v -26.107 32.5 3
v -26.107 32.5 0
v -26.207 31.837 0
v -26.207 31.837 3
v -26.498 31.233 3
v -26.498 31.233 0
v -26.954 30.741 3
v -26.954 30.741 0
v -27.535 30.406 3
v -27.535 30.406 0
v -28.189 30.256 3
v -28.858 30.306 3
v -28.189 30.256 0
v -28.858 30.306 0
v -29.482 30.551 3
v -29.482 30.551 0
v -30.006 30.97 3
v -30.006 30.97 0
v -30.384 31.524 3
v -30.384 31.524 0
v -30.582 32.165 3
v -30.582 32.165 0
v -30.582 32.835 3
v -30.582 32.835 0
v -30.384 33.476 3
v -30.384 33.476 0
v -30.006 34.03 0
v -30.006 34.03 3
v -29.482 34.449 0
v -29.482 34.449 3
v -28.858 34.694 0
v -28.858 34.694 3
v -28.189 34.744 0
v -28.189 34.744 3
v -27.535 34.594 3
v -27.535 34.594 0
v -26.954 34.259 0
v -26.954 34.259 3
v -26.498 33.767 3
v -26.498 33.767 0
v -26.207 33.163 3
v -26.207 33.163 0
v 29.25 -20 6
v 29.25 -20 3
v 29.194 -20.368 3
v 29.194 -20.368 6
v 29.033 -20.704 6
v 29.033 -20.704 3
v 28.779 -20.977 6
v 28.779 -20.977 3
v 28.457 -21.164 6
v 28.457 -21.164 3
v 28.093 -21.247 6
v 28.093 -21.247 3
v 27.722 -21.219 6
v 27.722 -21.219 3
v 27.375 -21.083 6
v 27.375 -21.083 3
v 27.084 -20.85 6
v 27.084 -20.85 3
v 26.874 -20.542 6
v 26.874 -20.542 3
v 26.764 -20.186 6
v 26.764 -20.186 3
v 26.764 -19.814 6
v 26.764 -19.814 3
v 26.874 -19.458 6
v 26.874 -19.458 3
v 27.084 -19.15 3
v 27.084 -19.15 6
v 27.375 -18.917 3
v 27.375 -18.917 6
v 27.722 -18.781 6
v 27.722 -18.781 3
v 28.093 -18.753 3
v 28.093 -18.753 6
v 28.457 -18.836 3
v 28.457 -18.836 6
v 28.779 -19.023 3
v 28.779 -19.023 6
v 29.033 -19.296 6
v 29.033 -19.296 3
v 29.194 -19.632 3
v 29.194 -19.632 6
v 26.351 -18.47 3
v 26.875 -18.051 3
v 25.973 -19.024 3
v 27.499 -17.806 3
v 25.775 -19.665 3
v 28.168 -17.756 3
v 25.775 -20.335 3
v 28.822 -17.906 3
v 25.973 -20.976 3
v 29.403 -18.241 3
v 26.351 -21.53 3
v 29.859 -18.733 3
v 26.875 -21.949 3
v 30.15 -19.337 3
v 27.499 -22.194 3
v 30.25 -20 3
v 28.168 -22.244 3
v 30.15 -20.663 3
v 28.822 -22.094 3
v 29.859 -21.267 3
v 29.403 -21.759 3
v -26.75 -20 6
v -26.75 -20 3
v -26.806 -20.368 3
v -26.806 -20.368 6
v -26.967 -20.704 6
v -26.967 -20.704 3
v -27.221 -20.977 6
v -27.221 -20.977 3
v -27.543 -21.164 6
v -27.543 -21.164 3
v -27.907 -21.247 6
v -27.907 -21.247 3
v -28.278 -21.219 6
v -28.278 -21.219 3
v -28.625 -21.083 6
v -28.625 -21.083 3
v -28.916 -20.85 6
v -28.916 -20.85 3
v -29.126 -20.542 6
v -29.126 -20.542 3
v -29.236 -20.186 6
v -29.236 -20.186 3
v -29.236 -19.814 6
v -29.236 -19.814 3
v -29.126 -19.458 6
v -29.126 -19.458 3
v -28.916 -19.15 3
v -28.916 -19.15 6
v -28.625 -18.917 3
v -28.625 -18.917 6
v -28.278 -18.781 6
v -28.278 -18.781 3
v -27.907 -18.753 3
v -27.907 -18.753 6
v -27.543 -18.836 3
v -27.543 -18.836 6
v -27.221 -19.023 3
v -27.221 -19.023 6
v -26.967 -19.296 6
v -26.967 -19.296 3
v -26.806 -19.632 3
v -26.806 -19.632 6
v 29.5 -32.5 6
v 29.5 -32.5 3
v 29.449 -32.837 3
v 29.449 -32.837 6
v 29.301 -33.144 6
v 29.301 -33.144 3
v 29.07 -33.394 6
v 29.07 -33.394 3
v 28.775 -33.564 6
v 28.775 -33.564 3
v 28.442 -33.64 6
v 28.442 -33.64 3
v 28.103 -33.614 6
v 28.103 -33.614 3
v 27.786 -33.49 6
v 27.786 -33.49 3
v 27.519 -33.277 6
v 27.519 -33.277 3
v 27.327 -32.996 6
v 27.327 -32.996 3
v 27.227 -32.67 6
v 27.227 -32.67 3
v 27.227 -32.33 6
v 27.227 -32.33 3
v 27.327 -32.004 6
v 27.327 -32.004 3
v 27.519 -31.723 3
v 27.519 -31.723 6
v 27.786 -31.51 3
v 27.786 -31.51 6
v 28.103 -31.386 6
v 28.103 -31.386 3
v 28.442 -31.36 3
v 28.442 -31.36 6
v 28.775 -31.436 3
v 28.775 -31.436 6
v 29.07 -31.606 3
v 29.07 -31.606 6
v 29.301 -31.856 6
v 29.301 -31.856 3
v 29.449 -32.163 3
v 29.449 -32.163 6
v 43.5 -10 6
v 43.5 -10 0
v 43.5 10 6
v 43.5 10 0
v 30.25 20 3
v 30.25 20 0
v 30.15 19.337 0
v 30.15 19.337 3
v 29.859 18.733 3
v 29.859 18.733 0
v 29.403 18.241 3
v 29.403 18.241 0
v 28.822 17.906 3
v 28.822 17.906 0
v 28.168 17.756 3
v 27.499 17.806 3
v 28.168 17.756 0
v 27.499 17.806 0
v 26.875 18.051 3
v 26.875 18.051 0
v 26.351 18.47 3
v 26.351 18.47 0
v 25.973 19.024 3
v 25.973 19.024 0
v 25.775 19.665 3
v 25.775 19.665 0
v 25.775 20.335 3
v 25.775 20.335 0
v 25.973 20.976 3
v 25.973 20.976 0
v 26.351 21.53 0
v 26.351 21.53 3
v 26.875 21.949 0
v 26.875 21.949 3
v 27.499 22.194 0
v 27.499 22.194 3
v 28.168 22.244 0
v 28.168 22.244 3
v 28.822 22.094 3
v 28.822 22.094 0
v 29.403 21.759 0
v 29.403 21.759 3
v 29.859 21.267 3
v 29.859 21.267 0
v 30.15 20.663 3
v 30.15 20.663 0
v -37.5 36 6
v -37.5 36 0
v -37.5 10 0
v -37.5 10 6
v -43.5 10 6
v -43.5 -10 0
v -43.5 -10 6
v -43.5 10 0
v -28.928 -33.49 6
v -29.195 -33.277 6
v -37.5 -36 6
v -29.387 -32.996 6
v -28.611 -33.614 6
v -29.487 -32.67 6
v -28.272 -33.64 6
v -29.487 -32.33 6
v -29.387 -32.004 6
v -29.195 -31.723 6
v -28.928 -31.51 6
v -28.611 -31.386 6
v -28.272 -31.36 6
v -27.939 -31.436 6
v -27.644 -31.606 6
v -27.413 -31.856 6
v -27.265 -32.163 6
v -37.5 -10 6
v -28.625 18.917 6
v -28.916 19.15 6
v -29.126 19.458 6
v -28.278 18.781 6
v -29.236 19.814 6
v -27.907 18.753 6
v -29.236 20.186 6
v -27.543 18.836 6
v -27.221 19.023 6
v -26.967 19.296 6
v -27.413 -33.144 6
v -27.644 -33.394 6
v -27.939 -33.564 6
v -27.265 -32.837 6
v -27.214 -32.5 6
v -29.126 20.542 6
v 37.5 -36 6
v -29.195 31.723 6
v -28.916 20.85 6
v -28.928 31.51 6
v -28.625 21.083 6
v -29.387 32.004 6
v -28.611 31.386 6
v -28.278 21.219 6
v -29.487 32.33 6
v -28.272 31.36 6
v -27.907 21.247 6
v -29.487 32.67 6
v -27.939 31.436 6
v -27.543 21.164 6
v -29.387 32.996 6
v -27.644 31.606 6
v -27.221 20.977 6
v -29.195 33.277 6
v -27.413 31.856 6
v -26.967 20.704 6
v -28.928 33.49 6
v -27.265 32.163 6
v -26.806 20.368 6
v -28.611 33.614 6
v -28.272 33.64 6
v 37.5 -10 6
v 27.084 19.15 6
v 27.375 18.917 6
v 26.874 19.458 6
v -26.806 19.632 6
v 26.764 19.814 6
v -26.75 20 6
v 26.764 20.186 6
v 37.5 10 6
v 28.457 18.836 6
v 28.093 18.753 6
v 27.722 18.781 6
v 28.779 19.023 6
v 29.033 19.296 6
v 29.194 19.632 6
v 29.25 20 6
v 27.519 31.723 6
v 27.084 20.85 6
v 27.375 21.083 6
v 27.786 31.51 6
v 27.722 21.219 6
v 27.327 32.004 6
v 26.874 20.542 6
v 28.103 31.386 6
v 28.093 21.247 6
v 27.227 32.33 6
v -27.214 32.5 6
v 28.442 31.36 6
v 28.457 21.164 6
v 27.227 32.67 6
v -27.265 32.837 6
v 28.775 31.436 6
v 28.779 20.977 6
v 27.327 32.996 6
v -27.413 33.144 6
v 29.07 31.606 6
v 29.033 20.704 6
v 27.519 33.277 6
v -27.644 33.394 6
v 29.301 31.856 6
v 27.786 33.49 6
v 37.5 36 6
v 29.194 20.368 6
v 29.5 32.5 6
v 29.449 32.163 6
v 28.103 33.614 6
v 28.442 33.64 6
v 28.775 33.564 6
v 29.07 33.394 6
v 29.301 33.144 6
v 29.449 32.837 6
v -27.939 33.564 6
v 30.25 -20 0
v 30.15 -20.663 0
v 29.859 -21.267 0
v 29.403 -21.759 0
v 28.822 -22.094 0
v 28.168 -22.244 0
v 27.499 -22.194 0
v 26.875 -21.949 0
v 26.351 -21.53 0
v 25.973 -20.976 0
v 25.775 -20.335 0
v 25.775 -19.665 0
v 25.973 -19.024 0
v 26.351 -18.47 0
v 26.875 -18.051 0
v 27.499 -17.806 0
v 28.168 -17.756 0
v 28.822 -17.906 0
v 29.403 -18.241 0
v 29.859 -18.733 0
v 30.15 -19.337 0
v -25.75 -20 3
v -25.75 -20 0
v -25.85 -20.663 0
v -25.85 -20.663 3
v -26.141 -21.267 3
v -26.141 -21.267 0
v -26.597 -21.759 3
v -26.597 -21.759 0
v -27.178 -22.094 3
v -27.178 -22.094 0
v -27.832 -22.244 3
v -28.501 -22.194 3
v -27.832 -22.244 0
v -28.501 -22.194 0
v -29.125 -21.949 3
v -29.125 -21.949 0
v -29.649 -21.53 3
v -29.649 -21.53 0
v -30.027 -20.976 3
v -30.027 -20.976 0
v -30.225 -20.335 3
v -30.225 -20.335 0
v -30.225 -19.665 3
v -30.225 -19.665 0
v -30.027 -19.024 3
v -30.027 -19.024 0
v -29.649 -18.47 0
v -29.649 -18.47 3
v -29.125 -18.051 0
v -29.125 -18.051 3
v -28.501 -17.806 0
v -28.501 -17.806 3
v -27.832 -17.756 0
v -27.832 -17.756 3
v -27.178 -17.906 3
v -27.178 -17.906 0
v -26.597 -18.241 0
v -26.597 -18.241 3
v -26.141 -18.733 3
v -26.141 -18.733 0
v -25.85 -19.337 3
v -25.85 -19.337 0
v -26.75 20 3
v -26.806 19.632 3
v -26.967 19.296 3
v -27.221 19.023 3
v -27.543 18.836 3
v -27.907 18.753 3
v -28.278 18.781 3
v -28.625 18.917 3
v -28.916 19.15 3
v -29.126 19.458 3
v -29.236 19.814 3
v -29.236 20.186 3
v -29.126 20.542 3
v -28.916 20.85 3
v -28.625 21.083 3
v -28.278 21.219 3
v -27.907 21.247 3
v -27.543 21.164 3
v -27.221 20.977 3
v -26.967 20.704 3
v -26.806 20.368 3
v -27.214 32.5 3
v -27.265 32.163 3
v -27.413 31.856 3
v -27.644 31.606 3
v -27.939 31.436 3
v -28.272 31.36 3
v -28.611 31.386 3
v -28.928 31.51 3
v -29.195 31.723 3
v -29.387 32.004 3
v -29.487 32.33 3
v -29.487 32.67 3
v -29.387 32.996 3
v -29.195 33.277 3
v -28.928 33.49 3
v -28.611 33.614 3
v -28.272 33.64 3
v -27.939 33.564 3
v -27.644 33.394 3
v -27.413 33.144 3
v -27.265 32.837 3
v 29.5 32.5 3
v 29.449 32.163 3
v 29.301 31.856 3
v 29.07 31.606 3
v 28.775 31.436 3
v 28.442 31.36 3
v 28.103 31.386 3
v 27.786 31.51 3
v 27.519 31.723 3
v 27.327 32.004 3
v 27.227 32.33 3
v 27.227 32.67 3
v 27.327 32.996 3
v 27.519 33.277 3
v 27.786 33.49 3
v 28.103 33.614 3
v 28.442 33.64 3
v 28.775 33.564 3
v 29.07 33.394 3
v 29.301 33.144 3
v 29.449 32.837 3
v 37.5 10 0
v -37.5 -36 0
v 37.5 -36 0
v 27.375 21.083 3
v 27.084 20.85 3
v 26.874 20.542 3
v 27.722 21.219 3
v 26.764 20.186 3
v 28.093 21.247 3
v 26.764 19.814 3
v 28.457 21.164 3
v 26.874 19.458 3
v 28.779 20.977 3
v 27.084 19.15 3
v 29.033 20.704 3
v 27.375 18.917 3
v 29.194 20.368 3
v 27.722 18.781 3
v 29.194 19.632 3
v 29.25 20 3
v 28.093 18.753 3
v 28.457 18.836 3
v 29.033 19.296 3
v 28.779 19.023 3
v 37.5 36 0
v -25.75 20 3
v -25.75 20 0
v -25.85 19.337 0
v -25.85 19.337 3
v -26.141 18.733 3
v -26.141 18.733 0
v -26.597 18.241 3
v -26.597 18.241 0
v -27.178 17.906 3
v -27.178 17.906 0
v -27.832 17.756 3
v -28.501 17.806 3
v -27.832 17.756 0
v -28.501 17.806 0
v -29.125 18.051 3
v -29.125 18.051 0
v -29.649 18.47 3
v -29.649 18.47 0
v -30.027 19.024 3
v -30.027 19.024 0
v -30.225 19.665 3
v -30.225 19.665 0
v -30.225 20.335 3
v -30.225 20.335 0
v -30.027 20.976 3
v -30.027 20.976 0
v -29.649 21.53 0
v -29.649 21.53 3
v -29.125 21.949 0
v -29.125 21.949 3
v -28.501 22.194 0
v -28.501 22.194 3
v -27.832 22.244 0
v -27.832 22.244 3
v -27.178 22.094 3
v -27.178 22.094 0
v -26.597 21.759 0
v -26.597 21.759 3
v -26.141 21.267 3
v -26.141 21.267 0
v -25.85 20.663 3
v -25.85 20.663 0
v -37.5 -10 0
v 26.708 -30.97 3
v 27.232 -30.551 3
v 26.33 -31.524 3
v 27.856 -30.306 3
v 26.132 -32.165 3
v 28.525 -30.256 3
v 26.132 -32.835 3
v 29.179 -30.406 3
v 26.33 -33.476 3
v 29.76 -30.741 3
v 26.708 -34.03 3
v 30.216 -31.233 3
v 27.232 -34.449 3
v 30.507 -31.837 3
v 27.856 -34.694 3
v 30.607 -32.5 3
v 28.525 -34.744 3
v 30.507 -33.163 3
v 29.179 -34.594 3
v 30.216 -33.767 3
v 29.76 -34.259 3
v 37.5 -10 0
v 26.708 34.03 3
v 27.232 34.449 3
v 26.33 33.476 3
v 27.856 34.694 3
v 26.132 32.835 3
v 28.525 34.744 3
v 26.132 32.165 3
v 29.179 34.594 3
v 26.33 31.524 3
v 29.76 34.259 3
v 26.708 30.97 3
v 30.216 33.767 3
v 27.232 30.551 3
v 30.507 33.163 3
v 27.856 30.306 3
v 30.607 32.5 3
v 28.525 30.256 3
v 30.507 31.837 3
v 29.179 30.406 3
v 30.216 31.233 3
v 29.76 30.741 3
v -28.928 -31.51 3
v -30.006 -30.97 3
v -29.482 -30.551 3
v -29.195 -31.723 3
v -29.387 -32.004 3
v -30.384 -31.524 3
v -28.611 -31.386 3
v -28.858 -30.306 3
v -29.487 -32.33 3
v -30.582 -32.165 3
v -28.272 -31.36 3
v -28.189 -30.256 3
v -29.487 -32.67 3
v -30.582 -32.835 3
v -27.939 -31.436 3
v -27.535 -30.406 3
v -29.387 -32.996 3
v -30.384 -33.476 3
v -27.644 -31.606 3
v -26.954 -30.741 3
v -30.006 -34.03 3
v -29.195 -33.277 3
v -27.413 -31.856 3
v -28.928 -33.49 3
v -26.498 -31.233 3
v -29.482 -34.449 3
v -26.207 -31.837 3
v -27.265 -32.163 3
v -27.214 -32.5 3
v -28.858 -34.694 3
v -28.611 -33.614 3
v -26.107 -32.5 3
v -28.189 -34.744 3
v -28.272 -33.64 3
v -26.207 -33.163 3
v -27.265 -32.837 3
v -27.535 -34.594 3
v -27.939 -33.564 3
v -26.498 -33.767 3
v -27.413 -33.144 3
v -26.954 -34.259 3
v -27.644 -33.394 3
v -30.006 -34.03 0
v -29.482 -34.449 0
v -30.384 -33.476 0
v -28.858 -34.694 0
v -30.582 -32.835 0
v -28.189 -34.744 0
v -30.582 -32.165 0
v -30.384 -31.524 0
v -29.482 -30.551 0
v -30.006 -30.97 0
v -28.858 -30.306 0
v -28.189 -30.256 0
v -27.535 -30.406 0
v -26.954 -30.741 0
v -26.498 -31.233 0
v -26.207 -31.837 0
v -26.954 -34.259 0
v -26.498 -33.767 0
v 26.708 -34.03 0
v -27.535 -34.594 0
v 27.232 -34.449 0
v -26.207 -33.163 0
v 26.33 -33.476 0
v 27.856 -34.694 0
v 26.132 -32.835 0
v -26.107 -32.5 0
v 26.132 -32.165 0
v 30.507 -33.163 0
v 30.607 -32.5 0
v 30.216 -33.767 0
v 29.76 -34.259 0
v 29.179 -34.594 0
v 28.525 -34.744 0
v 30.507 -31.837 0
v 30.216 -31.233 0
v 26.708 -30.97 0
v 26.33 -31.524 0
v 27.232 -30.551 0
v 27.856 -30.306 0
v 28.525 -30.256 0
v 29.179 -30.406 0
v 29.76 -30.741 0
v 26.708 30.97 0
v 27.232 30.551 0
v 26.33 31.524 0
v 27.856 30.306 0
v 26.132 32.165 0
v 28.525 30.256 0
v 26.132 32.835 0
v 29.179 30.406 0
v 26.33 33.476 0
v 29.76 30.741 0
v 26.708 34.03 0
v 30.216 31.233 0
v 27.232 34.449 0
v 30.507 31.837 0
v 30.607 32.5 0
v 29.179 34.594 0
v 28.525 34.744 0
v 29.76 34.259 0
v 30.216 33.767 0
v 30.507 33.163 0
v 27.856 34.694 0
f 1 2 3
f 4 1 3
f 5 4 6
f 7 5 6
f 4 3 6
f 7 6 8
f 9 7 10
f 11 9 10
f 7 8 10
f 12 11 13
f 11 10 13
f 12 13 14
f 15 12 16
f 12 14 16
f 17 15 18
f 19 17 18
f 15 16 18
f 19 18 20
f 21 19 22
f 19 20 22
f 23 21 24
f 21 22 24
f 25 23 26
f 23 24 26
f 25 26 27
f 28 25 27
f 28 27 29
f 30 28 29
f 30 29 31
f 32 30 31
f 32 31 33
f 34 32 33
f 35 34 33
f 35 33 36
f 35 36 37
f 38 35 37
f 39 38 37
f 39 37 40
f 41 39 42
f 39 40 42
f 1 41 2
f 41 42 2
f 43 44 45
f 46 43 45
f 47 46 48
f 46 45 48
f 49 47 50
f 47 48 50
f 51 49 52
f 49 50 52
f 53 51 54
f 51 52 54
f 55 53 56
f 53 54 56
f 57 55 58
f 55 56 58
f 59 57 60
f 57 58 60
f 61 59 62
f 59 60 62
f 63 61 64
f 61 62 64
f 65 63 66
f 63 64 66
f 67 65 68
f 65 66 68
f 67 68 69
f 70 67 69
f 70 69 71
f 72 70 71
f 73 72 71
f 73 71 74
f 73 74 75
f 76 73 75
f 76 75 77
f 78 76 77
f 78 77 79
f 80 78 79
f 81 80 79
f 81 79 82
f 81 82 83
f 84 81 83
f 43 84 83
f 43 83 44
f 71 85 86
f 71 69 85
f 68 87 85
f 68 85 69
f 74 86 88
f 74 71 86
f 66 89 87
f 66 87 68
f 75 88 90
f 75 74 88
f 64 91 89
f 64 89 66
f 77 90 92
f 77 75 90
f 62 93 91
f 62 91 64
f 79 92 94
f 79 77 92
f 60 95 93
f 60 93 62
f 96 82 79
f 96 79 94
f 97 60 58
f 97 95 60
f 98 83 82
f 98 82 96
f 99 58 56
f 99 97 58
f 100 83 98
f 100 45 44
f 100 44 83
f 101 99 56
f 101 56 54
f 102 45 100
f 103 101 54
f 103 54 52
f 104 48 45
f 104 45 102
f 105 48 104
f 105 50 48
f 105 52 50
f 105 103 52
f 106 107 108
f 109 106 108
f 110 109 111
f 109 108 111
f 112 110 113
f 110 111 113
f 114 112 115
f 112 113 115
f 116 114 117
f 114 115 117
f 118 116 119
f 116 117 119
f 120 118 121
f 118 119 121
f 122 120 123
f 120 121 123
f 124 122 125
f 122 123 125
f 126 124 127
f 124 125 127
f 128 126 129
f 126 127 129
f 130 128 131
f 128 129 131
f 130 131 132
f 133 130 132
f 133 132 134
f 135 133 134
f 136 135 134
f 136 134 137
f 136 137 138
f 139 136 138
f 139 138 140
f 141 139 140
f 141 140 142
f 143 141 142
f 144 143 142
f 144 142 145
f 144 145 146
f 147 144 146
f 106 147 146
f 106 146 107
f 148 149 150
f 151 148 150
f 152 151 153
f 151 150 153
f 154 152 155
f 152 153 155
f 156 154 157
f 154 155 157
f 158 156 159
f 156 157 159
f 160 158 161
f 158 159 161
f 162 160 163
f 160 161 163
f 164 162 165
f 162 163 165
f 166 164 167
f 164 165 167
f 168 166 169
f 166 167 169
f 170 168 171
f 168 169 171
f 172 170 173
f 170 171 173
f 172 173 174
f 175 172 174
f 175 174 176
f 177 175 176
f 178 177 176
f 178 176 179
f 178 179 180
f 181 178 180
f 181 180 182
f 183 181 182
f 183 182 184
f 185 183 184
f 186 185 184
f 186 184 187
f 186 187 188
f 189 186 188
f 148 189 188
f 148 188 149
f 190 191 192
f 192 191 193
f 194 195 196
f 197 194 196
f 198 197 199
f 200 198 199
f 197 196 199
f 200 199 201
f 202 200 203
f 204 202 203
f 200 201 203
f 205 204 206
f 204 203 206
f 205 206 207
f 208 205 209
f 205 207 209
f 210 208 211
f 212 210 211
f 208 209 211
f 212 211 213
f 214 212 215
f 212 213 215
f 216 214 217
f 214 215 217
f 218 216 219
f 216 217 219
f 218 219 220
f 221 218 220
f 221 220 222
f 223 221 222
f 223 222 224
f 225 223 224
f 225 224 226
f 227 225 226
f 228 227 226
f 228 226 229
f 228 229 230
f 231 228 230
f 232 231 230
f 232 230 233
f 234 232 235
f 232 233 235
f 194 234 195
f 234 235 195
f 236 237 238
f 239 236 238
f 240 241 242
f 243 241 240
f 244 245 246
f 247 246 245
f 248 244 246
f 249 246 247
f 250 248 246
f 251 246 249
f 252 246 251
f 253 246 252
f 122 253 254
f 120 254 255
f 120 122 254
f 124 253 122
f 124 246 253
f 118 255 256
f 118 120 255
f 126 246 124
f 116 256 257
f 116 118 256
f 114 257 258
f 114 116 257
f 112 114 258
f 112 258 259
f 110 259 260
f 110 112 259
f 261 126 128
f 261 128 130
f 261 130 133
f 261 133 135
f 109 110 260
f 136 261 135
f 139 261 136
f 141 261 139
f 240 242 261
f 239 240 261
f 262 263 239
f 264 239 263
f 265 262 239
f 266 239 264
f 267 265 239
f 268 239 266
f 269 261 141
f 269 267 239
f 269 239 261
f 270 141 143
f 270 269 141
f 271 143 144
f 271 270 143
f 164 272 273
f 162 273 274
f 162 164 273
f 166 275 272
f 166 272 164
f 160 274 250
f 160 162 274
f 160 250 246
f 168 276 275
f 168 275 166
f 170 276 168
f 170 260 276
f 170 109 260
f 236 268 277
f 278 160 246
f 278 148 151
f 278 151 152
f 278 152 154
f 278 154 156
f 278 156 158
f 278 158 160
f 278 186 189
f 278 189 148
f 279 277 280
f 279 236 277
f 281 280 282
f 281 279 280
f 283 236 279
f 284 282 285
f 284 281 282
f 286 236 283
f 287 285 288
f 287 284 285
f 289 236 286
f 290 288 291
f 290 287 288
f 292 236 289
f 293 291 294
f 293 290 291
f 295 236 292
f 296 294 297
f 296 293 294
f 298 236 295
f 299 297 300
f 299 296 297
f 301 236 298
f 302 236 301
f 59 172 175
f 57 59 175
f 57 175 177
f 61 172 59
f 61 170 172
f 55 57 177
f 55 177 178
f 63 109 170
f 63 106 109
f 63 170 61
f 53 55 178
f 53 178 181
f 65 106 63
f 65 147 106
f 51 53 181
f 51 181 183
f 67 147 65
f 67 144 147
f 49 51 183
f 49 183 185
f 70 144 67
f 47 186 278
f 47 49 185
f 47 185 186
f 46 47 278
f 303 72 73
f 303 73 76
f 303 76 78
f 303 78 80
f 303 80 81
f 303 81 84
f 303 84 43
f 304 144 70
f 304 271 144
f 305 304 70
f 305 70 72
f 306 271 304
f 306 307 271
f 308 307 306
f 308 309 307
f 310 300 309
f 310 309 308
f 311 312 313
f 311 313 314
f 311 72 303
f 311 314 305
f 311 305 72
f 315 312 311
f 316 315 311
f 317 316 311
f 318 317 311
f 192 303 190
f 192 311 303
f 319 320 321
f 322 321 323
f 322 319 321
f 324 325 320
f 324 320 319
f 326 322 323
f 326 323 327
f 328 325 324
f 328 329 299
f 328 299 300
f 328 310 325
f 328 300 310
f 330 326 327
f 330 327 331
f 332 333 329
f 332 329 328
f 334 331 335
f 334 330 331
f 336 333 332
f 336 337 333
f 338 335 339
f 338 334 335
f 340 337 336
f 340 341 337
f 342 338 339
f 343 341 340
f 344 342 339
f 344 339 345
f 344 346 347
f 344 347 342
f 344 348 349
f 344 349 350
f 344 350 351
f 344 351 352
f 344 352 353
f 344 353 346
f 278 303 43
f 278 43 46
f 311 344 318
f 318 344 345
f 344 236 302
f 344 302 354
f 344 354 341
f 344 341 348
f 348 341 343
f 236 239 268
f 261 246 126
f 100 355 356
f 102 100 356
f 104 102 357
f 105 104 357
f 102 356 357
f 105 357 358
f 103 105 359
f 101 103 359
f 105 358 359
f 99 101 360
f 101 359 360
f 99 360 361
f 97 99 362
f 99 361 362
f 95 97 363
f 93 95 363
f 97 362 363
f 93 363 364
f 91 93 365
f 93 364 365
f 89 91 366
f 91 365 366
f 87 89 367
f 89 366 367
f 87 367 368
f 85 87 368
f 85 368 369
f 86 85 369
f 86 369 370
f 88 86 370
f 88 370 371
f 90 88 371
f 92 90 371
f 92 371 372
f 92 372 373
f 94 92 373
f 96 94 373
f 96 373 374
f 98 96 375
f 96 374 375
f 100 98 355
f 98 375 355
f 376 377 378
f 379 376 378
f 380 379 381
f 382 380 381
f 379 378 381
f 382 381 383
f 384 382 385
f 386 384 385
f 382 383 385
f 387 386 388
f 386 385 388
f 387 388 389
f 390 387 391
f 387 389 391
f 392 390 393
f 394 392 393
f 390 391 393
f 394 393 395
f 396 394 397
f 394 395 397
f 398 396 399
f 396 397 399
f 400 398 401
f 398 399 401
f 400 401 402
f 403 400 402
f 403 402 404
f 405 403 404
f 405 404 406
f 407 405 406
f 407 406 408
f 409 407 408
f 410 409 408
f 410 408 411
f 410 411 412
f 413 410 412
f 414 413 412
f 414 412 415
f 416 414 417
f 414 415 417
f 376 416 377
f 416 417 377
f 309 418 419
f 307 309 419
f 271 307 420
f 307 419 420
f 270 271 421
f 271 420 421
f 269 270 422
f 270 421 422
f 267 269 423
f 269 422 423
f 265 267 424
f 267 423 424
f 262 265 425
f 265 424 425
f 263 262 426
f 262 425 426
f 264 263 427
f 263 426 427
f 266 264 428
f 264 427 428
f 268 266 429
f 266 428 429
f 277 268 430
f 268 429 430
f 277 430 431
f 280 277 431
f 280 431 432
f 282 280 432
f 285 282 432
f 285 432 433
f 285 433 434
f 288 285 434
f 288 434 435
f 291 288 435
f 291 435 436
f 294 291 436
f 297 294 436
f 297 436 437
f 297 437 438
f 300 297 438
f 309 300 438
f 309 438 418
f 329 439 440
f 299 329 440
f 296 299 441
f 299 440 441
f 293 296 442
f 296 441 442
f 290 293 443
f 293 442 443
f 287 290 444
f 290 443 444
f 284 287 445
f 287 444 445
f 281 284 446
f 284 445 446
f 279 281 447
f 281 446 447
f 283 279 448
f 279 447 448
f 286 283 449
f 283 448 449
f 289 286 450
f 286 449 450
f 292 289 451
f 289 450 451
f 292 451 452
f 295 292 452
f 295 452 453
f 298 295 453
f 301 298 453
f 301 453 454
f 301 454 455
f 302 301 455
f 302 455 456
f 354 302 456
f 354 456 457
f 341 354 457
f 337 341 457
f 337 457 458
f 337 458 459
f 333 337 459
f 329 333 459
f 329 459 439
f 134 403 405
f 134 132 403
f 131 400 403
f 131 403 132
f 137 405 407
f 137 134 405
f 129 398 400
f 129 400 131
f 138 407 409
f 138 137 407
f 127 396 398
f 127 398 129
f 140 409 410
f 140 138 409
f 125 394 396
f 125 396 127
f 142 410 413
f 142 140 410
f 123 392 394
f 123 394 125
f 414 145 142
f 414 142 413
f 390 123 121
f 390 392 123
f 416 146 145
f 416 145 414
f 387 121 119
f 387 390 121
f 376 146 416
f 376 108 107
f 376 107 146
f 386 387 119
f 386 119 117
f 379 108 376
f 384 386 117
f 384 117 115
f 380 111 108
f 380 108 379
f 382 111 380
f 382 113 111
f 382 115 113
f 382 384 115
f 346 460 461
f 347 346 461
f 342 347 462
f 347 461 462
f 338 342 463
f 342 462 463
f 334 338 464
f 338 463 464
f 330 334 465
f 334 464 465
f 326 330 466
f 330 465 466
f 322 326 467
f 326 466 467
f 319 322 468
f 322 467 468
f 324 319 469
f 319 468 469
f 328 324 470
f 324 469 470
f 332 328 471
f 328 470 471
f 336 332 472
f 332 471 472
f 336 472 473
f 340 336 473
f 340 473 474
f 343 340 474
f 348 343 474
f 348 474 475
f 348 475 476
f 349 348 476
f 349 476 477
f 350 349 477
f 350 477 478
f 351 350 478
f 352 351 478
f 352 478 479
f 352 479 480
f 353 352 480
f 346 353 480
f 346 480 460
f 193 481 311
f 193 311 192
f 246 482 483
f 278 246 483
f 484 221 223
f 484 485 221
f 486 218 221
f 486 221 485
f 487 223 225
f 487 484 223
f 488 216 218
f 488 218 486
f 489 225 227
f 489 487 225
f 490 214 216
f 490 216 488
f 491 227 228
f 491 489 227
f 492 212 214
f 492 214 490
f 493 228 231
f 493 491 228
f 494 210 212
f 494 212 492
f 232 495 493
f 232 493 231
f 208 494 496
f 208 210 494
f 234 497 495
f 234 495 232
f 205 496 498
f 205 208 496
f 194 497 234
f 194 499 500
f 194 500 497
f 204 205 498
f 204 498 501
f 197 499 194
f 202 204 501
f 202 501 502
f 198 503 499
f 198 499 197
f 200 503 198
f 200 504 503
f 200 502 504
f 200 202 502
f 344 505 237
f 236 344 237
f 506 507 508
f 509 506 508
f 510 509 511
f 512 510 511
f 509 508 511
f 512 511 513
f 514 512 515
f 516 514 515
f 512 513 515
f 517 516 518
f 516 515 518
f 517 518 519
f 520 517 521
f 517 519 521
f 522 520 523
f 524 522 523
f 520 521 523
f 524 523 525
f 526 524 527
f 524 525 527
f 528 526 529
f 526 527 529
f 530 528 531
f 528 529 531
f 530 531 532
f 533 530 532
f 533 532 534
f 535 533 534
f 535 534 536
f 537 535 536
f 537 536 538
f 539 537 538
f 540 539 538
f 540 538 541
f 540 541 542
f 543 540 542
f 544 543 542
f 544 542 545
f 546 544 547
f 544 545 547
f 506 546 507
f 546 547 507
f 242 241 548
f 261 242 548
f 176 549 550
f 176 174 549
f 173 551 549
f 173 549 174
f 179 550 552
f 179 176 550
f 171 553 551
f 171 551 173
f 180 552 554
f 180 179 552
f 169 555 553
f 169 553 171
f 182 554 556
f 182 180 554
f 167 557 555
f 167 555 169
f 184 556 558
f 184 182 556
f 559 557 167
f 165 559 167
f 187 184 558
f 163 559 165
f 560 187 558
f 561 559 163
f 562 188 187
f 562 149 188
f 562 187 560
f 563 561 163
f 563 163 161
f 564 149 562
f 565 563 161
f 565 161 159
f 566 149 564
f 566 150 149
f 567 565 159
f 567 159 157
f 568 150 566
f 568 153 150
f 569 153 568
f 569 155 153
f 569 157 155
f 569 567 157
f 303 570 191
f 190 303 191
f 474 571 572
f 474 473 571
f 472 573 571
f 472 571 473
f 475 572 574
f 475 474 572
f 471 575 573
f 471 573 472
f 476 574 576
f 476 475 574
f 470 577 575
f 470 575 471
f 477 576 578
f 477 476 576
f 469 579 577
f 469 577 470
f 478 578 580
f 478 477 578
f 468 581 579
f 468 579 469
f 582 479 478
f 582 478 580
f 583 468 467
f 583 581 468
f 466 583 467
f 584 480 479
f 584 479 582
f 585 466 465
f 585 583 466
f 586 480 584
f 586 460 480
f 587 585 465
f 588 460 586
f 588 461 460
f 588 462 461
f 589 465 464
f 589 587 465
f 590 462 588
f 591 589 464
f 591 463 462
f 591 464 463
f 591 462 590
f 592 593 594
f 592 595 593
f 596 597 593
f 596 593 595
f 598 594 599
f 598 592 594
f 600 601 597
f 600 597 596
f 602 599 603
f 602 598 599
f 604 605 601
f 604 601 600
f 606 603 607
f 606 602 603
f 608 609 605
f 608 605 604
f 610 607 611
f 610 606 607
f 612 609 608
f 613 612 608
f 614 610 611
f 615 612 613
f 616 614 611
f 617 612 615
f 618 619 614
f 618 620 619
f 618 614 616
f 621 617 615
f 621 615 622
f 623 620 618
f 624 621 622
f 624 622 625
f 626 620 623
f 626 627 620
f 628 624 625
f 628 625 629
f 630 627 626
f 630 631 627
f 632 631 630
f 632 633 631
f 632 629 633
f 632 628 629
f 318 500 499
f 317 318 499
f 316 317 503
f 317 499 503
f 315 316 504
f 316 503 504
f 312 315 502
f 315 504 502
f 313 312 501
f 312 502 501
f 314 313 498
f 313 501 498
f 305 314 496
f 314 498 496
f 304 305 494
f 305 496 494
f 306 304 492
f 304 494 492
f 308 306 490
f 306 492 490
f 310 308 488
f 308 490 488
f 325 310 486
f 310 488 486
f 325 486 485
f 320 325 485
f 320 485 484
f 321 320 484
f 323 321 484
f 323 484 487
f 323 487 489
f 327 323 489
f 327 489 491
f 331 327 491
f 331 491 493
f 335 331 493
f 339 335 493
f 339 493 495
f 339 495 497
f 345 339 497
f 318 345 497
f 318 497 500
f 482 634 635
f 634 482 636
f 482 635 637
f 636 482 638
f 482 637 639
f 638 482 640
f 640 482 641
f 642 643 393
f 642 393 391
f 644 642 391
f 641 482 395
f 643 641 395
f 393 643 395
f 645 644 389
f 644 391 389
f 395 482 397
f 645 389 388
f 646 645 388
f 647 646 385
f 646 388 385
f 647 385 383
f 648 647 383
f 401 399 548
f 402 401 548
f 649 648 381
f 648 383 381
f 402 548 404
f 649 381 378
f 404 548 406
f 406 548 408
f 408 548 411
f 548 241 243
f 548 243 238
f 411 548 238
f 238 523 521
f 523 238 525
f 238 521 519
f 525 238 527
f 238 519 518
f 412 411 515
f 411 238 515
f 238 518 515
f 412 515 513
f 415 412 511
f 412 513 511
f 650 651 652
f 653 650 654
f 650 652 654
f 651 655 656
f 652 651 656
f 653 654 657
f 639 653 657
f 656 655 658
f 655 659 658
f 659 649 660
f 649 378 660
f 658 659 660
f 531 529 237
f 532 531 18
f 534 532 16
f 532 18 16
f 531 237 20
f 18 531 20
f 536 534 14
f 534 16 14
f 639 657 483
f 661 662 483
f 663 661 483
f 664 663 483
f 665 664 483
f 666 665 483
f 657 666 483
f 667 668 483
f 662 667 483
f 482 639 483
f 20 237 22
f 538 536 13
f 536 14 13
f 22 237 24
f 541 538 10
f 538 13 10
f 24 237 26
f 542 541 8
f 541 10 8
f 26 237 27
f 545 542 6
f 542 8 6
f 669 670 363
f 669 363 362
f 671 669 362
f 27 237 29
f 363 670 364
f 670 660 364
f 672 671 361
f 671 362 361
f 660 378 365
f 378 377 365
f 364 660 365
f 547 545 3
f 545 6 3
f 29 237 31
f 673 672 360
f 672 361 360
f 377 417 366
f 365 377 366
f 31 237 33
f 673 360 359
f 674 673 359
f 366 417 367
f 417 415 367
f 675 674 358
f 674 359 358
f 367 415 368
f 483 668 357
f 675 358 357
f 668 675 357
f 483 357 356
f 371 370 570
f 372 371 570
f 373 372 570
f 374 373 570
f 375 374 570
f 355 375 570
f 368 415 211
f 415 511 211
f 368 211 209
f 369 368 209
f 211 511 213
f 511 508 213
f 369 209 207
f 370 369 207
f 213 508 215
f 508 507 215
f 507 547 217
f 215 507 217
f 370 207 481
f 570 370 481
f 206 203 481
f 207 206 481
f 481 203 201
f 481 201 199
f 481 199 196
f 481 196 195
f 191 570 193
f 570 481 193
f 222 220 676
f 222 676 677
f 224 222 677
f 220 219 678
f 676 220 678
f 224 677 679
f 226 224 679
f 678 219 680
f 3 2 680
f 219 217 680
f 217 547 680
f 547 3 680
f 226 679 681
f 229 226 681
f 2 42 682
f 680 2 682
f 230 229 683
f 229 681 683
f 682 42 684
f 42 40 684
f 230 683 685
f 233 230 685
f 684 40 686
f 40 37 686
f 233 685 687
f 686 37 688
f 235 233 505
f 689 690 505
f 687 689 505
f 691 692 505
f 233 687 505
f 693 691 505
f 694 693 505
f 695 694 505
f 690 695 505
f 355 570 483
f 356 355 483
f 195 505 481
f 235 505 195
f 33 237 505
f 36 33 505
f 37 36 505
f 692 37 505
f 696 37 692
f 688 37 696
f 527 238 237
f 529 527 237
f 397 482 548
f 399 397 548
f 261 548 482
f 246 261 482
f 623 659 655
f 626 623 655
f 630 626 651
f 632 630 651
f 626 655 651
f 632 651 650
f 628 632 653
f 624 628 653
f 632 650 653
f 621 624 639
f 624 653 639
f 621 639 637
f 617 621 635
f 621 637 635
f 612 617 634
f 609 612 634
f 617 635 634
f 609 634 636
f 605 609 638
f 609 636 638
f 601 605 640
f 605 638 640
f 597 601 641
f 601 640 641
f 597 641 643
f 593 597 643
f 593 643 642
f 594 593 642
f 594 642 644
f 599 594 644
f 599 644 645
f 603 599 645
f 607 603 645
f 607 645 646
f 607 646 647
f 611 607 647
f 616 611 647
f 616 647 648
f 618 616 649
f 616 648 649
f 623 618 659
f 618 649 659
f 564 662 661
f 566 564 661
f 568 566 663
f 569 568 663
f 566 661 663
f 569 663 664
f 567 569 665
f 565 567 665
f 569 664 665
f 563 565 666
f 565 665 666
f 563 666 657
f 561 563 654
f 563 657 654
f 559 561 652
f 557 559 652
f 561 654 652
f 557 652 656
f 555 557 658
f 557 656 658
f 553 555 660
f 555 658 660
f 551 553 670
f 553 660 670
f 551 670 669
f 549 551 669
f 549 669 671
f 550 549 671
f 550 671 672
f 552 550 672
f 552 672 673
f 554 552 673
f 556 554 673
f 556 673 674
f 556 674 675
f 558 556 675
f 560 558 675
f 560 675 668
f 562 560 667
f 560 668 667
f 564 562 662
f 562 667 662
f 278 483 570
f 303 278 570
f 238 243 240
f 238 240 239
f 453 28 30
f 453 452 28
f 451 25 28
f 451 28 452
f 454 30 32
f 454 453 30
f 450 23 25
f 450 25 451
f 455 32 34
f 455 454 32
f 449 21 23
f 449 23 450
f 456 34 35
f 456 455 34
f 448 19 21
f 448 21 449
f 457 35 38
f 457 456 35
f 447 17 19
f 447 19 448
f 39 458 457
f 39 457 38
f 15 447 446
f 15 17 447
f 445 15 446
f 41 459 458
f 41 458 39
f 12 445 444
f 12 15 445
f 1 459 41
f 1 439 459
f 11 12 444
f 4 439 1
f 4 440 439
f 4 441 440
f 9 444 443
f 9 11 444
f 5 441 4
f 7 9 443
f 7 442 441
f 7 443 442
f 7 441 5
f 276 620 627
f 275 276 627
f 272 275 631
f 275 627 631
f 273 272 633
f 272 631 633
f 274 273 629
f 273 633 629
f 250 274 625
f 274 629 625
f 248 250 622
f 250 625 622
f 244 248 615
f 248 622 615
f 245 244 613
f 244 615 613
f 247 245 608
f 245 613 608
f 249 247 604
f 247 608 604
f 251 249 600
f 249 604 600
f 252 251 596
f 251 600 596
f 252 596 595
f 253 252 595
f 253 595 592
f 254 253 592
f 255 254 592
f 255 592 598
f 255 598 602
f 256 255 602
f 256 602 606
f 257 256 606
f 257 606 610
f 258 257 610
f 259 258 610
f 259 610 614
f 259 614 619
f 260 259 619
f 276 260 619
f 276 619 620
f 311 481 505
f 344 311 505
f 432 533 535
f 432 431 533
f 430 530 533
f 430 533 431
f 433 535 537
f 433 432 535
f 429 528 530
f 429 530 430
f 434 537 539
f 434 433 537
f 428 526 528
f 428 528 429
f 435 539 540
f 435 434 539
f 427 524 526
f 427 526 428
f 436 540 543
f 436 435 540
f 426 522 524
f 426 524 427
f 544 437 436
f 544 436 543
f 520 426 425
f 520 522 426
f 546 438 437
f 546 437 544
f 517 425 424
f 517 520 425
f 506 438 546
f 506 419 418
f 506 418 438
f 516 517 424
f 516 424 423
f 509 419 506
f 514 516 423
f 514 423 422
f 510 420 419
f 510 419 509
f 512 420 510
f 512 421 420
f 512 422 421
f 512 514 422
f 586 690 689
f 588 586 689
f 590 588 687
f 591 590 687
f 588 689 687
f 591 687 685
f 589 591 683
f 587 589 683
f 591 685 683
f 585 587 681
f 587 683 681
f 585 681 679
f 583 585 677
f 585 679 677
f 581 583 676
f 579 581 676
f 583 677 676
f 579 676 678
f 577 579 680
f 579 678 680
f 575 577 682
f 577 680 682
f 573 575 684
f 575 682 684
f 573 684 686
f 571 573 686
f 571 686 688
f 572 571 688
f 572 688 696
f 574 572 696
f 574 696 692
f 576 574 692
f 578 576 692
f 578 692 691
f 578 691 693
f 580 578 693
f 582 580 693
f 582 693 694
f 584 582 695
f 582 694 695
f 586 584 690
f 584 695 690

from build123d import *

# Parameters (mm, degrees)
F0_W     = 6
F0_H     = 20
F1_DEPTH = 6
F2_R     = 2.25
F2_R_2   = 1.25
F2_R_3   = 1.143
F3_DEPTH = 3
F4_DEPTH = 6


with BuildPart() as f1:
    # F0 (on Top) → F1 (new body)
    with BuildSketch(Plane.XY):
        Polygon((-37.5, -36), (37.5, -36), (37.5, -10), (37.5, 10), (37.5, 36), (-37.5, 36), (-37.5, 10), (-37.5, -10), align=None)
        with Locations((40.5, 0)):
            Rectangle(F0_W, F0_H)
        with Locations((-40.5, 0)):
            Rectangle(F0_W, F0_H)
    extrude(amount=F1_DEPTH)

    # F2 (on face) → F3 (cut)
    with BuildSketch(Plane(origin=(0, 0, 0), x_dir=(1, 0, 0), z_dir=(0, 0, -1))):
        with Locations((-28, -20)):
            Circle(F2_R)
        with Locations((-28, -20)):
            Circle(F2_R_2, mode=Mode.SUBTRACT)
        with Locations((28, -20)):
            Circle(F2_R)
        with Locations((28, -20)):
            Circle(F2_R_2, mode=Mode.SUBTRACT)
        with Locations((-28, 20)):
            Circle(F2_R)
        with Locations((-28, 20)):
            Circle(F2_R_2, mode=Mode.SUBTRACT)
        with Locations((28, 20)):
            Circle(F2_R)
        with Locations((28, 20)):
            Circle(F2_R_2, mode=Mode.SUBTRACT)
        with Locations((-28.357, -32.5)):
            Circle(F2_R)
        with Locations((-28.357, -32.5)):
            Circle(F2_R_3, mode=Mode.SUBTRACT)
        with Locations((28.357, -32.5)):
            Circle(F2_R)
        with Locations((28.357, -32.5)):
            Circle(F2_R_3, mode=Mode.SUBTRACT)
        with Locations((-28.357, 32.5)):
            Circle(F2_R)
        with Locations((-28.357, 32.5)):
            Circle(F2_R_3, mode=Mode.SUBTRACT)
        with Locations((28.357, 32.5)):
            Circle(F2_R)
        with Locations((28.357, 32.5)):
            Circle(F2_R_3, mode=Mode.SUBTRACT)
    extrude(amount=-F3_DEPTH, mode=Mode.SUBTRACT)

    # F2 (on face) → F4 (cut, through all)
    with BuildSketch(Plane(origin=(0, 0, 0), x_dir=(1, 0, 0), z_dir=(0, 0, -1))):
        with Locations((-28, 20)):
            Circle(F2_R_2)
        with Locations((-28, -20)):
            Circle(F2_R_2)
        with Locations((28, -20)):
            Circle(F2_R_2)
        with Locations((28, 20)):
            Circle(F2_R_2)
        with Locations((-28.357, -32.5)):
            Circle(F2_R_3)
        with Locations((28.357, -32.5)):
            Circle(F2_R_3)
        with Locations((28.357, 32.5)):
            Circle(F2_R_3)
        with Locations((-28.357, 32.5)):
            Circle(F2_R_3)
    extrude(amount=-F4_DEPTH, mode=Mode.SUBTRACT)


solid = f1.part
